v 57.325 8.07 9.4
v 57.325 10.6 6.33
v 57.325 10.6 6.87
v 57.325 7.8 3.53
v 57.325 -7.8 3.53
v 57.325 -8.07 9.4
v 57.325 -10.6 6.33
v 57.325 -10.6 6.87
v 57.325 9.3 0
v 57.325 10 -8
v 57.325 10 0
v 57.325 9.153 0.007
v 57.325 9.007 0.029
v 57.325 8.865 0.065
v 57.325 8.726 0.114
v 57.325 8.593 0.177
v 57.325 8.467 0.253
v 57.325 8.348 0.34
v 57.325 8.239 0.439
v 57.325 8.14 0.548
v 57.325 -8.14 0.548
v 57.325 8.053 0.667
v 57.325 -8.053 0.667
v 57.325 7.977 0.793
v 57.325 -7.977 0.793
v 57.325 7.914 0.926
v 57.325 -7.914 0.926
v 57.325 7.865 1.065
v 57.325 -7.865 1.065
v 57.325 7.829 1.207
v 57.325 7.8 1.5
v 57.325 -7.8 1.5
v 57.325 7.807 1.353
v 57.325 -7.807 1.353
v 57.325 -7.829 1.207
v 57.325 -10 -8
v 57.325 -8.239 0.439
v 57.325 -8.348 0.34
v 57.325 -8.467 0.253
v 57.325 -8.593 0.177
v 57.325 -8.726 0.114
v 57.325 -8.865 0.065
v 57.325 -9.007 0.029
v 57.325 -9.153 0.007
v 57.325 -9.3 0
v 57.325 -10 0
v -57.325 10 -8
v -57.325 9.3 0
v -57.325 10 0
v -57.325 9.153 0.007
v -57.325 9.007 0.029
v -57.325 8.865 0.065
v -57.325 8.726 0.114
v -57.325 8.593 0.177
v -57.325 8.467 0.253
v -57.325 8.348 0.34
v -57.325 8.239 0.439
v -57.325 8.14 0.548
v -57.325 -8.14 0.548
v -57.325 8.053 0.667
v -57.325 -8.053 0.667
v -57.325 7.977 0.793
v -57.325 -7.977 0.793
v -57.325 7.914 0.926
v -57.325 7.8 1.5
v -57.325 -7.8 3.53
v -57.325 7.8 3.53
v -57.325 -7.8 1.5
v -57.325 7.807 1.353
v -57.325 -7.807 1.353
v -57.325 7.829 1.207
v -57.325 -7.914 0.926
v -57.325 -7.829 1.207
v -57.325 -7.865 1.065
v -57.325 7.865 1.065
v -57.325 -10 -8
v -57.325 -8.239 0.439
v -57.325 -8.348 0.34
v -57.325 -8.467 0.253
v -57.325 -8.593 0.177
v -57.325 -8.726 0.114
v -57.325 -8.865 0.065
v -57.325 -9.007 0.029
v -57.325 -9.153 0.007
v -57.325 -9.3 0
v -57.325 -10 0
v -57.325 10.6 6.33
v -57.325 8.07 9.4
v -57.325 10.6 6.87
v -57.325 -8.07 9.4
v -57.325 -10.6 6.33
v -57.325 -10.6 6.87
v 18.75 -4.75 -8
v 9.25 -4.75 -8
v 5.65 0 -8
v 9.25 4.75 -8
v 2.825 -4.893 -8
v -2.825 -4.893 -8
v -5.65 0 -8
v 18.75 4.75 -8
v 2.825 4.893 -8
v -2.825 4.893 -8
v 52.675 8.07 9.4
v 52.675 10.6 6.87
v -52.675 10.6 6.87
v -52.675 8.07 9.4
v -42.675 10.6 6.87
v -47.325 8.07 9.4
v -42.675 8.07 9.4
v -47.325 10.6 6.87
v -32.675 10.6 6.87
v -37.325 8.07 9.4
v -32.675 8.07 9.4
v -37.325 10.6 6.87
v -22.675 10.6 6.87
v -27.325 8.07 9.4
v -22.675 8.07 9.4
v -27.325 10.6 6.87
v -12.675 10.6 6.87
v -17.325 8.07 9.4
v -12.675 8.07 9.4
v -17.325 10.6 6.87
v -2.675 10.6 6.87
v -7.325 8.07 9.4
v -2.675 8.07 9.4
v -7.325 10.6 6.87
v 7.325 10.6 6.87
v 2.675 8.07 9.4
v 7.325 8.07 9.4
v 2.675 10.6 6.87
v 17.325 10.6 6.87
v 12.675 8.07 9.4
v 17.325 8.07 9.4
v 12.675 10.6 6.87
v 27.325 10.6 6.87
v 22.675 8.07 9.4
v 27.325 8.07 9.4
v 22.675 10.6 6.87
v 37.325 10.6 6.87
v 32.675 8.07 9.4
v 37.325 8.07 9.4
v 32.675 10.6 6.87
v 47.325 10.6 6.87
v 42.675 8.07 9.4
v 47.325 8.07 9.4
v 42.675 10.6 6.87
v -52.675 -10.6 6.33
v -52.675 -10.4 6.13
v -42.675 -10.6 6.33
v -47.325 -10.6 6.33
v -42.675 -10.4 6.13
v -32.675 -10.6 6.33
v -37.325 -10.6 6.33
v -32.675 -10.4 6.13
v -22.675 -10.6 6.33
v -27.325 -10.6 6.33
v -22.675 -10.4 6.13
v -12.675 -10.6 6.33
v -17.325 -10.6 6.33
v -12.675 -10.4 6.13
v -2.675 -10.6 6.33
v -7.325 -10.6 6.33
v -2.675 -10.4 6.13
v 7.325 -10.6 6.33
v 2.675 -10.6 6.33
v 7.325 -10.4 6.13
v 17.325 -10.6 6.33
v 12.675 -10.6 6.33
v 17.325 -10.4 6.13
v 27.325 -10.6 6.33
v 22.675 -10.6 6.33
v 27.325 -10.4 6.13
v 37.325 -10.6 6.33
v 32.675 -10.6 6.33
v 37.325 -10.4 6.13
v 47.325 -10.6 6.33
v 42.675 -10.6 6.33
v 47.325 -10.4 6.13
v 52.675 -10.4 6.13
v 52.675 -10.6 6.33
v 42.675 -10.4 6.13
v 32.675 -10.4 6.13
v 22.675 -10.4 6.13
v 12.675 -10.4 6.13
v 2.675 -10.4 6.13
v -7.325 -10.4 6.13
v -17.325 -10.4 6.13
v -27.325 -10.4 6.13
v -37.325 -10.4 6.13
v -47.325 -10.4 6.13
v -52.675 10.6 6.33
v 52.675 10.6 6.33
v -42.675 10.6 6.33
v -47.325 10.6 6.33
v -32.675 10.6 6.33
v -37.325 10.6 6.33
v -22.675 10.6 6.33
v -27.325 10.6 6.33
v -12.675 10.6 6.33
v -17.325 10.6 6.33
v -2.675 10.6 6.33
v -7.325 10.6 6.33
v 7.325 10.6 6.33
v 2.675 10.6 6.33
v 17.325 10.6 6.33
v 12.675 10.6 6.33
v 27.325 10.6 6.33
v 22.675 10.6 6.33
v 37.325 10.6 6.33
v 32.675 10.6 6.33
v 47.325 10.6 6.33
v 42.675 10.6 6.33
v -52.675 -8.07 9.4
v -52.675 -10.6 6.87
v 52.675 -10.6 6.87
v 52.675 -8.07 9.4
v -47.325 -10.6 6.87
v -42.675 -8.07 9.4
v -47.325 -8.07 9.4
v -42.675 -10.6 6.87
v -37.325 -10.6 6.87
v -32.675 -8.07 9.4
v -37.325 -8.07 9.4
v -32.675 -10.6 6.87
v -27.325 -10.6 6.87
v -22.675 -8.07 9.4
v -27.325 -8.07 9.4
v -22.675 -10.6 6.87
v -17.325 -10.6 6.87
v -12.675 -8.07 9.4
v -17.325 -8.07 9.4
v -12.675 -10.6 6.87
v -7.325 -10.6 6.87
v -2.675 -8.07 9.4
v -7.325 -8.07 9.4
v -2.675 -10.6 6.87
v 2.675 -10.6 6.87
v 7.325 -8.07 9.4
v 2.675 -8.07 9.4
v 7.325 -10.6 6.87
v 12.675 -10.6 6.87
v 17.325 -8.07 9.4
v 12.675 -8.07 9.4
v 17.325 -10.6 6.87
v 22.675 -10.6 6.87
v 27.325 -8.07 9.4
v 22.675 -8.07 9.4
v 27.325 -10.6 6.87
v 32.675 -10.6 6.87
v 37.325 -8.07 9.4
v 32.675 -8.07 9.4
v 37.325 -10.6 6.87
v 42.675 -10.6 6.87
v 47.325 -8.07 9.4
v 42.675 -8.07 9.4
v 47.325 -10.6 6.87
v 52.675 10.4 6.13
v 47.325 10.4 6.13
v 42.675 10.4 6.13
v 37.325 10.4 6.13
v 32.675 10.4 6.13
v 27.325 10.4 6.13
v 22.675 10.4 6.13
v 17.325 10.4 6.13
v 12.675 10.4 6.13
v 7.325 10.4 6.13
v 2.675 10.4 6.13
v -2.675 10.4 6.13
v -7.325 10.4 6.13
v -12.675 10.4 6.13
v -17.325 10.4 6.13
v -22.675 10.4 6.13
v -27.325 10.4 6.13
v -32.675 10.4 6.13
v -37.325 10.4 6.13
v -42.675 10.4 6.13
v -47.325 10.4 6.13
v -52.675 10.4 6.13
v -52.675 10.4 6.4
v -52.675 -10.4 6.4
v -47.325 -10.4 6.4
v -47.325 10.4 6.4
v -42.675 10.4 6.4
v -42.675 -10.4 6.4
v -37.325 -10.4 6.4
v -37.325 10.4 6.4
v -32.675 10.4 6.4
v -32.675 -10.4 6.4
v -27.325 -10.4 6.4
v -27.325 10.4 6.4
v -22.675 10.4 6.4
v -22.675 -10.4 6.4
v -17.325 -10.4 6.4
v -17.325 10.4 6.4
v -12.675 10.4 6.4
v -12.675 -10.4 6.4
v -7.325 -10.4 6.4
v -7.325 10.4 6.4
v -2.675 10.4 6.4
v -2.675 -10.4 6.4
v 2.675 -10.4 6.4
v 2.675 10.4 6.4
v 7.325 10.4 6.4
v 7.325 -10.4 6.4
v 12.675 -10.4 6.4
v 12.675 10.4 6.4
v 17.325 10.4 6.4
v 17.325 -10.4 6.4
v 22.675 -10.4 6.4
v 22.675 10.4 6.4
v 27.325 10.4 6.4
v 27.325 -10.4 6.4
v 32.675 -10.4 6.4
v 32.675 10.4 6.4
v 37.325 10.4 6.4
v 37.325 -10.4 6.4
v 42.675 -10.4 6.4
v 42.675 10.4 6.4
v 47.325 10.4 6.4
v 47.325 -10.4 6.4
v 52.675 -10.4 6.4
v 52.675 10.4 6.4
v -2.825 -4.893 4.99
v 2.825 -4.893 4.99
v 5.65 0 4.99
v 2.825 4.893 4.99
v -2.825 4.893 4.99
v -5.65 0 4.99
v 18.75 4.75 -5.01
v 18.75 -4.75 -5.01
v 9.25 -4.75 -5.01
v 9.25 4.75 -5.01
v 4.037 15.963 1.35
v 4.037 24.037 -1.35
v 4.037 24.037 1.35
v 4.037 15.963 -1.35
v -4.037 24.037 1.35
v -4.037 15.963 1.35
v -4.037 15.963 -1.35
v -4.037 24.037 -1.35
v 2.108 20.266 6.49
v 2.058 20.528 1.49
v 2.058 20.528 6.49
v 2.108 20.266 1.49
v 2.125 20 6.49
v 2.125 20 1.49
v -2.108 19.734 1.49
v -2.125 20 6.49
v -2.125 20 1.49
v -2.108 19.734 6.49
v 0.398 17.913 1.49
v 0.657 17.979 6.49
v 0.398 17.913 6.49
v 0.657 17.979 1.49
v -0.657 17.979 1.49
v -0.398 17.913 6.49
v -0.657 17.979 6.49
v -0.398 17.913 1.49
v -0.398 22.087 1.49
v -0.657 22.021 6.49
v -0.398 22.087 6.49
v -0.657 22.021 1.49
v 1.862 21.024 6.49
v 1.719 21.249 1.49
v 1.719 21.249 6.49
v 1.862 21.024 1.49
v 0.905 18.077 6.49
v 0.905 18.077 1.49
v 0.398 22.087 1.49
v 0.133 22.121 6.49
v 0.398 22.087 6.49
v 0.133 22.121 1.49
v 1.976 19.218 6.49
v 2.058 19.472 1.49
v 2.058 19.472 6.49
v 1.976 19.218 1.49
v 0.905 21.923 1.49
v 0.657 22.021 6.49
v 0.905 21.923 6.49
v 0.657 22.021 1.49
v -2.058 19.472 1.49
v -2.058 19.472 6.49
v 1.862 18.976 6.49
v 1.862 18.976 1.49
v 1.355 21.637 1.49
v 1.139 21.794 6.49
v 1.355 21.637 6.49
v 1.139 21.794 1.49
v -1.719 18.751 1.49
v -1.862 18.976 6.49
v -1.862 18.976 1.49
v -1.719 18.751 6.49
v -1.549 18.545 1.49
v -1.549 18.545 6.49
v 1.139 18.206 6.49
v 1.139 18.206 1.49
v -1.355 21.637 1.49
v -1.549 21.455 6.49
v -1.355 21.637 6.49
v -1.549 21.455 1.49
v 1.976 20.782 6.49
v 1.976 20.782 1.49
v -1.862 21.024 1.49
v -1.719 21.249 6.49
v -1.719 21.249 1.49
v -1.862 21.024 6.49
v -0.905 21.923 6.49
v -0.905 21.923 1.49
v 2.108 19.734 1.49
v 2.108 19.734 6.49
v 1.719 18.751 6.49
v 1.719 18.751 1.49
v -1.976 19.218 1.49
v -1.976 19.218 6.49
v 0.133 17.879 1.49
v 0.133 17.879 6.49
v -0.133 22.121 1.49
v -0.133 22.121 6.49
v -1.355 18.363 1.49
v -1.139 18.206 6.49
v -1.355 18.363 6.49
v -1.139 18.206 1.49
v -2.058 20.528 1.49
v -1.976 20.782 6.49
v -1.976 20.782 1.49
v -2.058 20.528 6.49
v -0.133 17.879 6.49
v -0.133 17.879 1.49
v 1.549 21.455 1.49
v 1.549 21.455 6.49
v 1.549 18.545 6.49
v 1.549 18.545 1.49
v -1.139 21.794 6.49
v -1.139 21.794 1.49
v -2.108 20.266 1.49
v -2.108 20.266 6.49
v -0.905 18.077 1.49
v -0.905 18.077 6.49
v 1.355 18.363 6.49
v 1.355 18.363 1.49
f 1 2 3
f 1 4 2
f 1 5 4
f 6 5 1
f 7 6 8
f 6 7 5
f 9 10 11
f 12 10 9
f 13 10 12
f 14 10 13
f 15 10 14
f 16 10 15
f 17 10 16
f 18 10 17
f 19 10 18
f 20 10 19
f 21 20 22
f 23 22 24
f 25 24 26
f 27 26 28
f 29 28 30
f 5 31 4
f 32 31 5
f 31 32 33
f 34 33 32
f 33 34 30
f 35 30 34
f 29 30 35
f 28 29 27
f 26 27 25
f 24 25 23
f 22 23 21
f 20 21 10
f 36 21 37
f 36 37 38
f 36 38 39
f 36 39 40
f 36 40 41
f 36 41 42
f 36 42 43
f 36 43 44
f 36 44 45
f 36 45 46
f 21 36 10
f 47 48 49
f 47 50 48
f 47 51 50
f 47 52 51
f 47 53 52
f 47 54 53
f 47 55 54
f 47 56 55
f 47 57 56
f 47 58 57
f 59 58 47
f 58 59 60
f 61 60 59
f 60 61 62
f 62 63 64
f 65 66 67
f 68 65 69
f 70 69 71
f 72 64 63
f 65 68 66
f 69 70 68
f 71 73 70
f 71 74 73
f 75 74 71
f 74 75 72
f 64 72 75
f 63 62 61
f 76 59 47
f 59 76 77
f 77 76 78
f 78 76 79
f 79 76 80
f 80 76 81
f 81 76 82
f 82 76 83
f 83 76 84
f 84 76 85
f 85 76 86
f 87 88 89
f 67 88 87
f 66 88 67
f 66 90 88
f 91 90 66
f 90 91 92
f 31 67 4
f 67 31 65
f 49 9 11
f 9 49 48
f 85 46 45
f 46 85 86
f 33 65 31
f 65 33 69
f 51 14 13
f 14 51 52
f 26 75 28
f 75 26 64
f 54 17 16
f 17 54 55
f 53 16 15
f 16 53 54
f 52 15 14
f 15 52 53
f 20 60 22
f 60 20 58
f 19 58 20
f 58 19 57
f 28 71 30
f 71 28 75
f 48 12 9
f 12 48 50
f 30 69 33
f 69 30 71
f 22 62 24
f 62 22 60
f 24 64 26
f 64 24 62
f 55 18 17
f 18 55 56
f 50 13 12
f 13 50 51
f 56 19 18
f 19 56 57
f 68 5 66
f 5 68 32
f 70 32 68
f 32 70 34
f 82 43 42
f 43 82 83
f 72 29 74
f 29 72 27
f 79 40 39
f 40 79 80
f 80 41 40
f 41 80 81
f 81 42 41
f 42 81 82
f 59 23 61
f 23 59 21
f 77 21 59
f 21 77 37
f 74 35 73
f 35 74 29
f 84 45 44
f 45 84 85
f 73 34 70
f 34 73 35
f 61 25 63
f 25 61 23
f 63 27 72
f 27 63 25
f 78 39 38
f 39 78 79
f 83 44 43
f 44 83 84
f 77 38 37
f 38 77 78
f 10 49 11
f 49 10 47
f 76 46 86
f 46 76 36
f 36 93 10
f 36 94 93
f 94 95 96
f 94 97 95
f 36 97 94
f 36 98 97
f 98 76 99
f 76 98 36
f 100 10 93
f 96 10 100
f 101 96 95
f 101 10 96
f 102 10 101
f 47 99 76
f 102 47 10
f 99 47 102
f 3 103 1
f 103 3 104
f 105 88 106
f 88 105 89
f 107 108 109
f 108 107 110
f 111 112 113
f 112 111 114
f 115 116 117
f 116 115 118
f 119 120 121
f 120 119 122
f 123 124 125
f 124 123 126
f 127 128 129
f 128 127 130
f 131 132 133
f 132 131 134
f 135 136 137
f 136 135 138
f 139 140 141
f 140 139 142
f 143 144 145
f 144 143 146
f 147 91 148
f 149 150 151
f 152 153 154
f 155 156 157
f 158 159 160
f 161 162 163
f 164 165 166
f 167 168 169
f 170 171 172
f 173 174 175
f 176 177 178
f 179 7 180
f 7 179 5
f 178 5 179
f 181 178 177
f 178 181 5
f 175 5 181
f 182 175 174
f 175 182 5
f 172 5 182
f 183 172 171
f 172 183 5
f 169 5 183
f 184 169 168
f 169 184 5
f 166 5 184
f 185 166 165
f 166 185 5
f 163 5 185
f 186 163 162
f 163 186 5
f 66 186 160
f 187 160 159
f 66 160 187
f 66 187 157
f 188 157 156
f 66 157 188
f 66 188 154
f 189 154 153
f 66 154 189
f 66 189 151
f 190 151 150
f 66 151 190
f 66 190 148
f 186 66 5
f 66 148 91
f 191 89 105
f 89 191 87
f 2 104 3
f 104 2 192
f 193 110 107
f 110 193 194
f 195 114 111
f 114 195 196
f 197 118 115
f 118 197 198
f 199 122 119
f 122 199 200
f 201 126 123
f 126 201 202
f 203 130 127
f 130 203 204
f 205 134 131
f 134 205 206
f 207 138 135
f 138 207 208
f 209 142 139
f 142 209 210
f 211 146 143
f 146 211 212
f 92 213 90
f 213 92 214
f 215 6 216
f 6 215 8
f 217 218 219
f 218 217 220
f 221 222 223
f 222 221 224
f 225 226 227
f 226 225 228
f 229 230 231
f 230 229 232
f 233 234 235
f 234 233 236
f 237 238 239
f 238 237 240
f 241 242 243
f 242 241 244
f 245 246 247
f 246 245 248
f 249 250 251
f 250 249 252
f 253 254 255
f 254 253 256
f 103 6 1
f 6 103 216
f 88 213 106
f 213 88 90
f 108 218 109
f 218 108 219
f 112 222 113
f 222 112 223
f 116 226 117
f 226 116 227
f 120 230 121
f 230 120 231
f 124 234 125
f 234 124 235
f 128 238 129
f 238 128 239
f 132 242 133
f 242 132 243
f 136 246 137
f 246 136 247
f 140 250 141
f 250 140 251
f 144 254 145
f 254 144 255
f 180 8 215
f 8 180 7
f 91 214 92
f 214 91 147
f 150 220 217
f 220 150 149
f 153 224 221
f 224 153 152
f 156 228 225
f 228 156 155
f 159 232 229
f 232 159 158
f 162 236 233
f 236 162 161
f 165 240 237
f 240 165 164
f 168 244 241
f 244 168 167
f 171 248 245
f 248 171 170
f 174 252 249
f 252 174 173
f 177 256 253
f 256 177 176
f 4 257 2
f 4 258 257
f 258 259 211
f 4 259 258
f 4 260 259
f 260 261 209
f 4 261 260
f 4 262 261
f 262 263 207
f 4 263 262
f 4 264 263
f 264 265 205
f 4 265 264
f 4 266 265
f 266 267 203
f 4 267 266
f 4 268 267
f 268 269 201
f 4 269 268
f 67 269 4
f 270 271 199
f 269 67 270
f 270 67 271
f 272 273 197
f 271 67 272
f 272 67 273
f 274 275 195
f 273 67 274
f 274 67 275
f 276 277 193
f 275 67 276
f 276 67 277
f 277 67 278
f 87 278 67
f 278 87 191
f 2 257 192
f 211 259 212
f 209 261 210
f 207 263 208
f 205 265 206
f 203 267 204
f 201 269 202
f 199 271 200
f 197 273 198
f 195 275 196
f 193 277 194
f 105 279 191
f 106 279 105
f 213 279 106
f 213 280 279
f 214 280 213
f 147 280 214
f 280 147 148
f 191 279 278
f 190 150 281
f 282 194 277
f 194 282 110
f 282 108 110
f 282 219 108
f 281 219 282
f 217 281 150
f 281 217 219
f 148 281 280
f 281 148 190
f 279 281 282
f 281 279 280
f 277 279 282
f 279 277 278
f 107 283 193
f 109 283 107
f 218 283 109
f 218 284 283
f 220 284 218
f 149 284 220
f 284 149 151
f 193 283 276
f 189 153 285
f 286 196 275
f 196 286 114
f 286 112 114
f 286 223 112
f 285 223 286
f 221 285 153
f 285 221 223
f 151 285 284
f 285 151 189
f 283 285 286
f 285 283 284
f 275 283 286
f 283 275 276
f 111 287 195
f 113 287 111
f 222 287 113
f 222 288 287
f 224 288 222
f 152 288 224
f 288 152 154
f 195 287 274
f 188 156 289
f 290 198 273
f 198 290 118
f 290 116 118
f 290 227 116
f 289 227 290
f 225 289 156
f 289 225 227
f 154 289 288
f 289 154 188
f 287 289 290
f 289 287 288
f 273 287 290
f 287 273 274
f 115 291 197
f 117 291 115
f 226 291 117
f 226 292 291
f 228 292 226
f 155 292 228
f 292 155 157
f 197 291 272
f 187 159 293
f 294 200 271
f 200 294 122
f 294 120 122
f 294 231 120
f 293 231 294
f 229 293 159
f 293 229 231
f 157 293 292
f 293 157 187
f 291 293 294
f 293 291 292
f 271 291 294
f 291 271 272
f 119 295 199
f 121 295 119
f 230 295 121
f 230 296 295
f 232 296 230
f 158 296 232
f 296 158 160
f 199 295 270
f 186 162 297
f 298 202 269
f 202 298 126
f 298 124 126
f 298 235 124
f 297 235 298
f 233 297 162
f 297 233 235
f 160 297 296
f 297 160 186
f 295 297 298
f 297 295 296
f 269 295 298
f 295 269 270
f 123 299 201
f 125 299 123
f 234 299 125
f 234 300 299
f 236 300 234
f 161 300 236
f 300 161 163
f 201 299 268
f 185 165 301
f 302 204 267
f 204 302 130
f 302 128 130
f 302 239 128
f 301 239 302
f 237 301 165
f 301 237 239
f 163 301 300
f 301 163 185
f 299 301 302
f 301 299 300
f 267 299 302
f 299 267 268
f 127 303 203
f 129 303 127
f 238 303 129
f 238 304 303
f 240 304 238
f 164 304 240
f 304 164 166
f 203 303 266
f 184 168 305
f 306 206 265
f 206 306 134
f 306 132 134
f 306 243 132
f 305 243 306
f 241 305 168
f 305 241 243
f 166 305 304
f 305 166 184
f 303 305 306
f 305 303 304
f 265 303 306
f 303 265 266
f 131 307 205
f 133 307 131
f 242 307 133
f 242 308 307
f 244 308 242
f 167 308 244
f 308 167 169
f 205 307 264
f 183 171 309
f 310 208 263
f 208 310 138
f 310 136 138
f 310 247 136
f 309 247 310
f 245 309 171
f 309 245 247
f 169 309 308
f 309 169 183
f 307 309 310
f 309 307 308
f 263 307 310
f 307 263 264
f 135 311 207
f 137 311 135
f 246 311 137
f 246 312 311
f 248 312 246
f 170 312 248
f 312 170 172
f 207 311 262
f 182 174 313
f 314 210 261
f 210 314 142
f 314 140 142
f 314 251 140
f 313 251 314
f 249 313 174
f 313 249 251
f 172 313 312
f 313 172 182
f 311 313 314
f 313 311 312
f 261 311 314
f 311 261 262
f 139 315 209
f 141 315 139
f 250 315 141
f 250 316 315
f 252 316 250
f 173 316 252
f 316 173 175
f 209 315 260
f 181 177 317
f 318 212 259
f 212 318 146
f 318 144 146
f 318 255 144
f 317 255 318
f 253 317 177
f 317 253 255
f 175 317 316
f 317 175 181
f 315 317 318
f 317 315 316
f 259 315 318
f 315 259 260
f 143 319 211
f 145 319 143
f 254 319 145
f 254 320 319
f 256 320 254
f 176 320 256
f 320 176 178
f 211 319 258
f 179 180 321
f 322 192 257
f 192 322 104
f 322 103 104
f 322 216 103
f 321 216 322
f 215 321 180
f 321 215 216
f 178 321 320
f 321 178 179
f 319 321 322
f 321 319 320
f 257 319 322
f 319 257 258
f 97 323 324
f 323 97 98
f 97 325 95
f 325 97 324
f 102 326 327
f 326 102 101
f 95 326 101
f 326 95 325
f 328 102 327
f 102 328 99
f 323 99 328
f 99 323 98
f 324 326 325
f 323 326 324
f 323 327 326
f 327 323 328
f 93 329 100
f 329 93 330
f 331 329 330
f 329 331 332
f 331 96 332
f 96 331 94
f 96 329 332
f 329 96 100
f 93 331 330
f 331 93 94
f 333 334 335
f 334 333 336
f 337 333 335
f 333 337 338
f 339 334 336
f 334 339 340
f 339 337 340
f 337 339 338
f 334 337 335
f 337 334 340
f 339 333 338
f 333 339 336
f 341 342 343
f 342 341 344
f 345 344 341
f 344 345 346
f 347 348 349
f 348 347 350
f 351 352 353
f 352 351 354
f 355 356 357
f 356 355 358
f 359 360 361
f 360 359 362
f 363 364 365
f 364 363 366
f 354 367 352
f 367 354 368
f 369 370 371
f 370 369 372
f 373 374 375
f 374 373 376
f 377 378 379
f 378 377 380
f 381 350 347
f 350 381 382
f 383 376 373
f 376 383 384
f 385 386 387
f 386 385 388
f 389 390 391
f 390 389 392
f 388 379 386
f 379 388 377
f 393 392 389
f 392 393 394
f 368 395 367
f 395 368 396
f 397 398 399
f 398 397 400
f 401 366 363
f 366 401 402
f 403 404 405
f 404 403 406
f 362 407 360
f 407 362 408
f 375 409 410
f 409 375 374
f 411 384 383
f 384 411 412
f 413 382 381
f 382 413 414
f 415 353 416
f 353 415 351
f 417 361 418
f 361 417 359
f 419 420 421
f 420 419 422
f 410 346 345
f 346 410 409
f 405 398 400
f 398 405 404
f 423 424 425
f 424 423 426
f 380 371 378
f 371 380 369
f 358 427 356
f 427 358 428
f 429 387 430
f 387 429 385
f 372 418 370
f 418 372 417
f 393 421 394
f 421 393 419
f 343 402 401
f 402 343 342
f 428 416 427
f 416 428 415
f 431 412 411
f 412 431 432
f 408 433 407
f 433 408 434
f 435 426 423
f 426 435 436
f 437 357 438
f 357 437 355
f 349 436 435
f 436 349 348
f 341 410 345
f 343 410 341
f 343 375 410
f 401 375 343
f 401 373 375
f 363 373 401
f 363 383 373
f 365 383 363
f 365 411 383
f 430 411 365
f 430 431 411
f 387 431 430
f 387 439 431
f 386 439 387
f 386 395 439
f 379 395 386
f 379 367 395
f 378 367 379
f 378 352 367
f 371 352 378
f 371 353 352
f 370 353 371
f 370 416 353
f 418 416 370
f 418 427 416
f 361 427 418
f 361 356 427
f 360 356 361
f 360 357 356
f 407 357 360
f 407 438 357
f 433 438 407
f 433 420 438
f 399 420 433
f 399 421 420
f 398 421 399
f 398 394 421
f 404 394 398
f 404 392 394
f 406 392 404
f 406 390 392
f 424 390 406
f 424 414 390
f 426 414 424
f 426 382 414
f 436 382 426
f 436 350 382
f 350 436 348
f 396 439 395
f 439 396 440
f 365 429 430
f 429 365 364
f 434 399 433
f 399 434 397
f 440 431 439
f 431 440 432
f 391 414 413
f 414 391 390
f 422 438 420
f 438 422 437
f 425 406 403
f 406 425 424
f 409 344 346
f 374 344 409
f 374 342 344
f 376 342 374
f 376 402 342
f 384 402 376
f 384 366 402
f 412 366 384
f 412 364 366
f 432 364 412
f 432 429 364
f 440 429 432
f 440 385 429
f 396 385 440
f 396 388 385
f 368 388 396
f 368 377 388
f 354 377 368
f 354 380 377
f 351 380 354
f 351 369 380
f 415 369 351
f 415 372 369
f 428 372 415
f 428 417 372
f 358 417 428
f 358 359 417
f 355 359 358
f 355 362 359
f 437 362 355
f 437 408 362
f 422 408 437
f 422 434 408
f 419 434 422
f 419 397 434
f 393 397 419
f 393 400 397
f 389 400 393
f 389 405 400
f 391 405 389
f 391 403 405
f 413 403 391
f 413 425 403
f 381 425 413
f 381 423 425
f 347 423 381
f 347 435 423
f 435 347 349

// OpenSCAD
// file: Parametric_NATO_Picatinny_Rail.scad
// Slightly modified from original so that the base height can be
// specified on the call.

nato_rail (1, true, 10);


    module nato_rail (n, has_base, railBaseHeight=5)
    {
        ws = 5.35;

        h0 = railBaseHeight;
        h1 = 3.53;
        h2 = 5.87;
        h3 = 3;

        w0 = 20;
        w1 = 15.6;
        
        l = 10 * (n + 1) - ws;
        
        translate ([0, 0, - h0])
        rotate ([90, 0, 90])
        translate ([0, 0, -l/2])
        rail(h0, h1, l, w0, w1);
        
        
        module rail(h0, h1, l, w0, w1)
        {
            difference ()
            {
                union ()
                {
                    railbase(h0, h1, l, w0, w1, has_base);
                    translate ([0, h0 + h1, 0])
                    railprism (l);
                };
                union ()
                {
                    for (i = [1:1:n]) {
                        translate ([0, h0 + h1, 10 * i - ws])
                        railslot(ws);
                    }
                };
            };
        };

        module railbase (h0, h1, l, w0, w1, has_base)
        {
            if (has_base) {
                translate ([0, h0 / 2, l/2])
                cube ([w0, h0, l], center = true);
                mirror([1,0,0])
                basefillet (h0, l, w1);
                basefillet (h0, l, w1);
            }
            translate ([0, h0 + h1 / 2, l/2])
            cube ([w1, h1, l], center = true);
        }
        
        module basefillet (h0, l, w1)
        {
        difference() {
                translate ([w1 / 2, h0, 0])
                cube ([1.5, 1.5, l]);
                translate ([w1 / 2 + 1.5, h0 + 1.5, l / 2])
                cylinder (l+1, 1.5, 1.5, $fn=64, center = true);
            }
        }
        
        module railprism (l)
        {
            linear_extrude (height = l, convexity = 10)
            polygon (points = [[7.8, 0], [10.6, 2.8], [10.6, 3.34], [8.07, 5.87], [-8.07, 5.87], [-10.6, 3.34], [-10.6, 2.8], [-7.8, 0]], convexity = 10);
        }
        
        module railslot (l)
        {
            linear_extrude (height = l, convexity = 10)
            polygon (points = [[11, 6], [11, 2.65], [10.4, 2.6], [10.4, 2.87], [-10.4, 2.87], [-10.4, 2.6], [-11, 2.65], [-11, 6]], convexity = 10);
        }
        
    }
// main file
bothParts=true;
part1=true;
part2=!part1;

use <Parametric_NATO_Picatinny_Rail.scad>;

antiRotationPinInsertSide=9.5;
antiRotationPinInsertDepth=3;
antiRotationPinCenterOffset=14;
antiRotationPinDia=4.25;
antiRotationPinLength=5;

railBaseHeight=8;
overlap=0.01;

if (bothParts || part1) {
    difference () {
        nato_rail (11, true, railBaseHeight);
        translate([0,0,-railBaseHeight-overlap])
            cylinder(d=11.3, h=13, $fn=6);
        translate([antiRotationPinCenterOffset,0,-railBaseHeight-overlap+antiRotationPinInsertDepth/2])
            cube([antiRotationPinInsertSide,antiRotationPinInsertSide,antiRotationPinInsertDepth], center=true);
    }
}
if (bothParts || part2) {
    translate([0,20,0])
    union() {
        scale([0.85,0.85,0.9])
            cube([antiRotationPinInsertSide,antiRotationPinInsertSide,antiRotationPinInsertDepth],
                center=true);
        translate([0,0,antiRotationPinInsertDepth/2-overlap])
            cylinder(d=antiRotationPinDia,h=antiRotationPinLength, $fn=50);
    }
}


 
